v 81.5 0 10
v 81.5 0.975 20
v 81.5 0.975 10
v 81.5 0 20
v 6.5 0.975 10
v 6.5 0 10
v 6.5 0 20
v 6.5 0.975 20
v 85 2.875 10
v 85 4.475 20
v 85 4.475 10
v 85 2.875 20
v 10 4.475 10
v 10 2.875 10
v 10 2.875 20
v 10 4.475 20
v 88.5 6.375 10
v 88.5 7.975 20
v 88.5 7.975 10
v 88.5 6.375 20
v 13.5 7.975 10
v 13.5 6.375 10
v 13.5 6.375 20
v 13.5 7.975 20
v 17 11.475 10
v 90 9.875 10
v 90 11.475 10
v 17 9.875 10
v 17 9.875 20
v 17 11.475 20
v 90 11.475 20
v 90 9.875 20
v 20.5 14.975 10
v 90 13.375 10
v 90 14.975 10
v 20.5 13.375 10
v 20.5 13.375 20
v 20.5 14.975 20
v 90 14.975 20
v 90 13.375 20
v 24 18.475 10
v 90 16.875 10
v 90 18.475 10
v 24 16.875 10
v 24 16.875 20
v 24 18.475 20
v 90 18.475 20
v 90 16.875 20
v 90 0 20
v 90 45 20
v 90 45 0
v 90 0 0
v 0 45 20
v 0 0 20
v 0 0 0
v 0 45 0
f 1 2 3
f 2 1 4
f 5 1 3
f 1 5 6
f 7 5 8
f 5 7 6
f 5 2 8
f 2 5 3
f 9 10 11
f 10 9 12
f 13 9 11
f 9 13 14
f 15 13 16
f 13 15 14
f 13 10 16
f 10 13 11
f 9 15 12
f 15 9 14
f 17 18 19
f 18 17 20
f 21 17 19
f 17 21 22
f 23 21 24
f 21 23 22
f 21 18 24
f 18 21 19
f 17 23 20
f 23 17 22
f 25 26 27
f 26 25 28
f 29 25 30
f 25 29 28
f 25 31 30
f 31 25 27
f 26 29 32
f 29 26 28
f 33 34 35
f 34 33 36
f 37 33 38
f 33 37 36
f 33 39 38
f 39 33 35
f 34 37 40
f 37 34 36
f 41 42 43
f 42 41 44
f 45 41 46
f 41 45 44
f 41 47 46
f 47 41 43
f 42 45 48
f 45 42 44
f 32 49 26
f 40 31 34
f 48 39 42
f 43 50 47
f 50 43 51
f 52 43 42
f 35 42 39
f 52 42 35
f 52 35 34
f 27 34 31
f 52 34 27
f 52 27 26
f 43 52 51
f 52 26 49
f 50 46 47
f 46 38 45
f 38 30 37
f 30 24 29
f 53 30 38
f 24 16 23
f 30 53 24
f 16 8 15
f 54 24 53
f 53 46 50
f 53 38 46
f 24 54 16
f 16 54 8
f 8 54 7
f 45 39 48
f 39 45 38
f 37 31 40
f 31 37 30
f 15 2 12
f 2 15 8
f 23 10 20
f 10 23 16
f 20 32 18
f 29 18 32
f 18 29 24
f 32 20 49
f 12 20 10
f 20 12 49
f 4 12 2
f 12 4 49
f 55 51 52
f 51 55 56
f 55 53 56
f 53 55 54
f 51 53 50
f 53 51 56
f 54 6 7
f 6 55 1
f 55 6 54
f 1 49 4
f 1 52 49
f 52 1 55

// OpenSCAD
// Slide drying rack
// Units: mm. Print orientation: base on XY plane, slots open upward (+Z).

// ---- Block ----
block_len   = 90;    // block length along X
block_wid   = 45;    // block width along Y
block_ht    = 20;    // block height along Z

// ---- Slots ----
slot_count  = 10;    // number of slide slots
slot_len    = 75;    // slot length along X
slot_wid    = 1.6;   // slot width along Y
slot_depth  = 10;    // slot depth into block (from top face)
slot_pitch  = 3.5;   // centre-to-centre spacing in Y
slot_overcut = 0.5;  // extra cutter length past faces to avoid coplanar faces

// ---- Derived ----
x0 = -block_len/2 + slot_len/2;  // first slot start X (group centred in X)
y0 = -block_wid/2 + slot_pitch/2 * (slot_count - 1)/2;  // first slot centre Y

$fn = 64;

difference() {
    // Solid base block
    translate([0, 0, 0])
        cube([block_len, block_wid, block_ht]);

    // Parallel slots, open at top
    for (i = [0 : slot_count - 1]) {
        translate([x0 + i * slot_pitch, y0 + i * slot_pitch, block_ht - slot_depth])
            cube([slot_len, slot_wid, slot_depth + slot_overcut]);
    }
}
